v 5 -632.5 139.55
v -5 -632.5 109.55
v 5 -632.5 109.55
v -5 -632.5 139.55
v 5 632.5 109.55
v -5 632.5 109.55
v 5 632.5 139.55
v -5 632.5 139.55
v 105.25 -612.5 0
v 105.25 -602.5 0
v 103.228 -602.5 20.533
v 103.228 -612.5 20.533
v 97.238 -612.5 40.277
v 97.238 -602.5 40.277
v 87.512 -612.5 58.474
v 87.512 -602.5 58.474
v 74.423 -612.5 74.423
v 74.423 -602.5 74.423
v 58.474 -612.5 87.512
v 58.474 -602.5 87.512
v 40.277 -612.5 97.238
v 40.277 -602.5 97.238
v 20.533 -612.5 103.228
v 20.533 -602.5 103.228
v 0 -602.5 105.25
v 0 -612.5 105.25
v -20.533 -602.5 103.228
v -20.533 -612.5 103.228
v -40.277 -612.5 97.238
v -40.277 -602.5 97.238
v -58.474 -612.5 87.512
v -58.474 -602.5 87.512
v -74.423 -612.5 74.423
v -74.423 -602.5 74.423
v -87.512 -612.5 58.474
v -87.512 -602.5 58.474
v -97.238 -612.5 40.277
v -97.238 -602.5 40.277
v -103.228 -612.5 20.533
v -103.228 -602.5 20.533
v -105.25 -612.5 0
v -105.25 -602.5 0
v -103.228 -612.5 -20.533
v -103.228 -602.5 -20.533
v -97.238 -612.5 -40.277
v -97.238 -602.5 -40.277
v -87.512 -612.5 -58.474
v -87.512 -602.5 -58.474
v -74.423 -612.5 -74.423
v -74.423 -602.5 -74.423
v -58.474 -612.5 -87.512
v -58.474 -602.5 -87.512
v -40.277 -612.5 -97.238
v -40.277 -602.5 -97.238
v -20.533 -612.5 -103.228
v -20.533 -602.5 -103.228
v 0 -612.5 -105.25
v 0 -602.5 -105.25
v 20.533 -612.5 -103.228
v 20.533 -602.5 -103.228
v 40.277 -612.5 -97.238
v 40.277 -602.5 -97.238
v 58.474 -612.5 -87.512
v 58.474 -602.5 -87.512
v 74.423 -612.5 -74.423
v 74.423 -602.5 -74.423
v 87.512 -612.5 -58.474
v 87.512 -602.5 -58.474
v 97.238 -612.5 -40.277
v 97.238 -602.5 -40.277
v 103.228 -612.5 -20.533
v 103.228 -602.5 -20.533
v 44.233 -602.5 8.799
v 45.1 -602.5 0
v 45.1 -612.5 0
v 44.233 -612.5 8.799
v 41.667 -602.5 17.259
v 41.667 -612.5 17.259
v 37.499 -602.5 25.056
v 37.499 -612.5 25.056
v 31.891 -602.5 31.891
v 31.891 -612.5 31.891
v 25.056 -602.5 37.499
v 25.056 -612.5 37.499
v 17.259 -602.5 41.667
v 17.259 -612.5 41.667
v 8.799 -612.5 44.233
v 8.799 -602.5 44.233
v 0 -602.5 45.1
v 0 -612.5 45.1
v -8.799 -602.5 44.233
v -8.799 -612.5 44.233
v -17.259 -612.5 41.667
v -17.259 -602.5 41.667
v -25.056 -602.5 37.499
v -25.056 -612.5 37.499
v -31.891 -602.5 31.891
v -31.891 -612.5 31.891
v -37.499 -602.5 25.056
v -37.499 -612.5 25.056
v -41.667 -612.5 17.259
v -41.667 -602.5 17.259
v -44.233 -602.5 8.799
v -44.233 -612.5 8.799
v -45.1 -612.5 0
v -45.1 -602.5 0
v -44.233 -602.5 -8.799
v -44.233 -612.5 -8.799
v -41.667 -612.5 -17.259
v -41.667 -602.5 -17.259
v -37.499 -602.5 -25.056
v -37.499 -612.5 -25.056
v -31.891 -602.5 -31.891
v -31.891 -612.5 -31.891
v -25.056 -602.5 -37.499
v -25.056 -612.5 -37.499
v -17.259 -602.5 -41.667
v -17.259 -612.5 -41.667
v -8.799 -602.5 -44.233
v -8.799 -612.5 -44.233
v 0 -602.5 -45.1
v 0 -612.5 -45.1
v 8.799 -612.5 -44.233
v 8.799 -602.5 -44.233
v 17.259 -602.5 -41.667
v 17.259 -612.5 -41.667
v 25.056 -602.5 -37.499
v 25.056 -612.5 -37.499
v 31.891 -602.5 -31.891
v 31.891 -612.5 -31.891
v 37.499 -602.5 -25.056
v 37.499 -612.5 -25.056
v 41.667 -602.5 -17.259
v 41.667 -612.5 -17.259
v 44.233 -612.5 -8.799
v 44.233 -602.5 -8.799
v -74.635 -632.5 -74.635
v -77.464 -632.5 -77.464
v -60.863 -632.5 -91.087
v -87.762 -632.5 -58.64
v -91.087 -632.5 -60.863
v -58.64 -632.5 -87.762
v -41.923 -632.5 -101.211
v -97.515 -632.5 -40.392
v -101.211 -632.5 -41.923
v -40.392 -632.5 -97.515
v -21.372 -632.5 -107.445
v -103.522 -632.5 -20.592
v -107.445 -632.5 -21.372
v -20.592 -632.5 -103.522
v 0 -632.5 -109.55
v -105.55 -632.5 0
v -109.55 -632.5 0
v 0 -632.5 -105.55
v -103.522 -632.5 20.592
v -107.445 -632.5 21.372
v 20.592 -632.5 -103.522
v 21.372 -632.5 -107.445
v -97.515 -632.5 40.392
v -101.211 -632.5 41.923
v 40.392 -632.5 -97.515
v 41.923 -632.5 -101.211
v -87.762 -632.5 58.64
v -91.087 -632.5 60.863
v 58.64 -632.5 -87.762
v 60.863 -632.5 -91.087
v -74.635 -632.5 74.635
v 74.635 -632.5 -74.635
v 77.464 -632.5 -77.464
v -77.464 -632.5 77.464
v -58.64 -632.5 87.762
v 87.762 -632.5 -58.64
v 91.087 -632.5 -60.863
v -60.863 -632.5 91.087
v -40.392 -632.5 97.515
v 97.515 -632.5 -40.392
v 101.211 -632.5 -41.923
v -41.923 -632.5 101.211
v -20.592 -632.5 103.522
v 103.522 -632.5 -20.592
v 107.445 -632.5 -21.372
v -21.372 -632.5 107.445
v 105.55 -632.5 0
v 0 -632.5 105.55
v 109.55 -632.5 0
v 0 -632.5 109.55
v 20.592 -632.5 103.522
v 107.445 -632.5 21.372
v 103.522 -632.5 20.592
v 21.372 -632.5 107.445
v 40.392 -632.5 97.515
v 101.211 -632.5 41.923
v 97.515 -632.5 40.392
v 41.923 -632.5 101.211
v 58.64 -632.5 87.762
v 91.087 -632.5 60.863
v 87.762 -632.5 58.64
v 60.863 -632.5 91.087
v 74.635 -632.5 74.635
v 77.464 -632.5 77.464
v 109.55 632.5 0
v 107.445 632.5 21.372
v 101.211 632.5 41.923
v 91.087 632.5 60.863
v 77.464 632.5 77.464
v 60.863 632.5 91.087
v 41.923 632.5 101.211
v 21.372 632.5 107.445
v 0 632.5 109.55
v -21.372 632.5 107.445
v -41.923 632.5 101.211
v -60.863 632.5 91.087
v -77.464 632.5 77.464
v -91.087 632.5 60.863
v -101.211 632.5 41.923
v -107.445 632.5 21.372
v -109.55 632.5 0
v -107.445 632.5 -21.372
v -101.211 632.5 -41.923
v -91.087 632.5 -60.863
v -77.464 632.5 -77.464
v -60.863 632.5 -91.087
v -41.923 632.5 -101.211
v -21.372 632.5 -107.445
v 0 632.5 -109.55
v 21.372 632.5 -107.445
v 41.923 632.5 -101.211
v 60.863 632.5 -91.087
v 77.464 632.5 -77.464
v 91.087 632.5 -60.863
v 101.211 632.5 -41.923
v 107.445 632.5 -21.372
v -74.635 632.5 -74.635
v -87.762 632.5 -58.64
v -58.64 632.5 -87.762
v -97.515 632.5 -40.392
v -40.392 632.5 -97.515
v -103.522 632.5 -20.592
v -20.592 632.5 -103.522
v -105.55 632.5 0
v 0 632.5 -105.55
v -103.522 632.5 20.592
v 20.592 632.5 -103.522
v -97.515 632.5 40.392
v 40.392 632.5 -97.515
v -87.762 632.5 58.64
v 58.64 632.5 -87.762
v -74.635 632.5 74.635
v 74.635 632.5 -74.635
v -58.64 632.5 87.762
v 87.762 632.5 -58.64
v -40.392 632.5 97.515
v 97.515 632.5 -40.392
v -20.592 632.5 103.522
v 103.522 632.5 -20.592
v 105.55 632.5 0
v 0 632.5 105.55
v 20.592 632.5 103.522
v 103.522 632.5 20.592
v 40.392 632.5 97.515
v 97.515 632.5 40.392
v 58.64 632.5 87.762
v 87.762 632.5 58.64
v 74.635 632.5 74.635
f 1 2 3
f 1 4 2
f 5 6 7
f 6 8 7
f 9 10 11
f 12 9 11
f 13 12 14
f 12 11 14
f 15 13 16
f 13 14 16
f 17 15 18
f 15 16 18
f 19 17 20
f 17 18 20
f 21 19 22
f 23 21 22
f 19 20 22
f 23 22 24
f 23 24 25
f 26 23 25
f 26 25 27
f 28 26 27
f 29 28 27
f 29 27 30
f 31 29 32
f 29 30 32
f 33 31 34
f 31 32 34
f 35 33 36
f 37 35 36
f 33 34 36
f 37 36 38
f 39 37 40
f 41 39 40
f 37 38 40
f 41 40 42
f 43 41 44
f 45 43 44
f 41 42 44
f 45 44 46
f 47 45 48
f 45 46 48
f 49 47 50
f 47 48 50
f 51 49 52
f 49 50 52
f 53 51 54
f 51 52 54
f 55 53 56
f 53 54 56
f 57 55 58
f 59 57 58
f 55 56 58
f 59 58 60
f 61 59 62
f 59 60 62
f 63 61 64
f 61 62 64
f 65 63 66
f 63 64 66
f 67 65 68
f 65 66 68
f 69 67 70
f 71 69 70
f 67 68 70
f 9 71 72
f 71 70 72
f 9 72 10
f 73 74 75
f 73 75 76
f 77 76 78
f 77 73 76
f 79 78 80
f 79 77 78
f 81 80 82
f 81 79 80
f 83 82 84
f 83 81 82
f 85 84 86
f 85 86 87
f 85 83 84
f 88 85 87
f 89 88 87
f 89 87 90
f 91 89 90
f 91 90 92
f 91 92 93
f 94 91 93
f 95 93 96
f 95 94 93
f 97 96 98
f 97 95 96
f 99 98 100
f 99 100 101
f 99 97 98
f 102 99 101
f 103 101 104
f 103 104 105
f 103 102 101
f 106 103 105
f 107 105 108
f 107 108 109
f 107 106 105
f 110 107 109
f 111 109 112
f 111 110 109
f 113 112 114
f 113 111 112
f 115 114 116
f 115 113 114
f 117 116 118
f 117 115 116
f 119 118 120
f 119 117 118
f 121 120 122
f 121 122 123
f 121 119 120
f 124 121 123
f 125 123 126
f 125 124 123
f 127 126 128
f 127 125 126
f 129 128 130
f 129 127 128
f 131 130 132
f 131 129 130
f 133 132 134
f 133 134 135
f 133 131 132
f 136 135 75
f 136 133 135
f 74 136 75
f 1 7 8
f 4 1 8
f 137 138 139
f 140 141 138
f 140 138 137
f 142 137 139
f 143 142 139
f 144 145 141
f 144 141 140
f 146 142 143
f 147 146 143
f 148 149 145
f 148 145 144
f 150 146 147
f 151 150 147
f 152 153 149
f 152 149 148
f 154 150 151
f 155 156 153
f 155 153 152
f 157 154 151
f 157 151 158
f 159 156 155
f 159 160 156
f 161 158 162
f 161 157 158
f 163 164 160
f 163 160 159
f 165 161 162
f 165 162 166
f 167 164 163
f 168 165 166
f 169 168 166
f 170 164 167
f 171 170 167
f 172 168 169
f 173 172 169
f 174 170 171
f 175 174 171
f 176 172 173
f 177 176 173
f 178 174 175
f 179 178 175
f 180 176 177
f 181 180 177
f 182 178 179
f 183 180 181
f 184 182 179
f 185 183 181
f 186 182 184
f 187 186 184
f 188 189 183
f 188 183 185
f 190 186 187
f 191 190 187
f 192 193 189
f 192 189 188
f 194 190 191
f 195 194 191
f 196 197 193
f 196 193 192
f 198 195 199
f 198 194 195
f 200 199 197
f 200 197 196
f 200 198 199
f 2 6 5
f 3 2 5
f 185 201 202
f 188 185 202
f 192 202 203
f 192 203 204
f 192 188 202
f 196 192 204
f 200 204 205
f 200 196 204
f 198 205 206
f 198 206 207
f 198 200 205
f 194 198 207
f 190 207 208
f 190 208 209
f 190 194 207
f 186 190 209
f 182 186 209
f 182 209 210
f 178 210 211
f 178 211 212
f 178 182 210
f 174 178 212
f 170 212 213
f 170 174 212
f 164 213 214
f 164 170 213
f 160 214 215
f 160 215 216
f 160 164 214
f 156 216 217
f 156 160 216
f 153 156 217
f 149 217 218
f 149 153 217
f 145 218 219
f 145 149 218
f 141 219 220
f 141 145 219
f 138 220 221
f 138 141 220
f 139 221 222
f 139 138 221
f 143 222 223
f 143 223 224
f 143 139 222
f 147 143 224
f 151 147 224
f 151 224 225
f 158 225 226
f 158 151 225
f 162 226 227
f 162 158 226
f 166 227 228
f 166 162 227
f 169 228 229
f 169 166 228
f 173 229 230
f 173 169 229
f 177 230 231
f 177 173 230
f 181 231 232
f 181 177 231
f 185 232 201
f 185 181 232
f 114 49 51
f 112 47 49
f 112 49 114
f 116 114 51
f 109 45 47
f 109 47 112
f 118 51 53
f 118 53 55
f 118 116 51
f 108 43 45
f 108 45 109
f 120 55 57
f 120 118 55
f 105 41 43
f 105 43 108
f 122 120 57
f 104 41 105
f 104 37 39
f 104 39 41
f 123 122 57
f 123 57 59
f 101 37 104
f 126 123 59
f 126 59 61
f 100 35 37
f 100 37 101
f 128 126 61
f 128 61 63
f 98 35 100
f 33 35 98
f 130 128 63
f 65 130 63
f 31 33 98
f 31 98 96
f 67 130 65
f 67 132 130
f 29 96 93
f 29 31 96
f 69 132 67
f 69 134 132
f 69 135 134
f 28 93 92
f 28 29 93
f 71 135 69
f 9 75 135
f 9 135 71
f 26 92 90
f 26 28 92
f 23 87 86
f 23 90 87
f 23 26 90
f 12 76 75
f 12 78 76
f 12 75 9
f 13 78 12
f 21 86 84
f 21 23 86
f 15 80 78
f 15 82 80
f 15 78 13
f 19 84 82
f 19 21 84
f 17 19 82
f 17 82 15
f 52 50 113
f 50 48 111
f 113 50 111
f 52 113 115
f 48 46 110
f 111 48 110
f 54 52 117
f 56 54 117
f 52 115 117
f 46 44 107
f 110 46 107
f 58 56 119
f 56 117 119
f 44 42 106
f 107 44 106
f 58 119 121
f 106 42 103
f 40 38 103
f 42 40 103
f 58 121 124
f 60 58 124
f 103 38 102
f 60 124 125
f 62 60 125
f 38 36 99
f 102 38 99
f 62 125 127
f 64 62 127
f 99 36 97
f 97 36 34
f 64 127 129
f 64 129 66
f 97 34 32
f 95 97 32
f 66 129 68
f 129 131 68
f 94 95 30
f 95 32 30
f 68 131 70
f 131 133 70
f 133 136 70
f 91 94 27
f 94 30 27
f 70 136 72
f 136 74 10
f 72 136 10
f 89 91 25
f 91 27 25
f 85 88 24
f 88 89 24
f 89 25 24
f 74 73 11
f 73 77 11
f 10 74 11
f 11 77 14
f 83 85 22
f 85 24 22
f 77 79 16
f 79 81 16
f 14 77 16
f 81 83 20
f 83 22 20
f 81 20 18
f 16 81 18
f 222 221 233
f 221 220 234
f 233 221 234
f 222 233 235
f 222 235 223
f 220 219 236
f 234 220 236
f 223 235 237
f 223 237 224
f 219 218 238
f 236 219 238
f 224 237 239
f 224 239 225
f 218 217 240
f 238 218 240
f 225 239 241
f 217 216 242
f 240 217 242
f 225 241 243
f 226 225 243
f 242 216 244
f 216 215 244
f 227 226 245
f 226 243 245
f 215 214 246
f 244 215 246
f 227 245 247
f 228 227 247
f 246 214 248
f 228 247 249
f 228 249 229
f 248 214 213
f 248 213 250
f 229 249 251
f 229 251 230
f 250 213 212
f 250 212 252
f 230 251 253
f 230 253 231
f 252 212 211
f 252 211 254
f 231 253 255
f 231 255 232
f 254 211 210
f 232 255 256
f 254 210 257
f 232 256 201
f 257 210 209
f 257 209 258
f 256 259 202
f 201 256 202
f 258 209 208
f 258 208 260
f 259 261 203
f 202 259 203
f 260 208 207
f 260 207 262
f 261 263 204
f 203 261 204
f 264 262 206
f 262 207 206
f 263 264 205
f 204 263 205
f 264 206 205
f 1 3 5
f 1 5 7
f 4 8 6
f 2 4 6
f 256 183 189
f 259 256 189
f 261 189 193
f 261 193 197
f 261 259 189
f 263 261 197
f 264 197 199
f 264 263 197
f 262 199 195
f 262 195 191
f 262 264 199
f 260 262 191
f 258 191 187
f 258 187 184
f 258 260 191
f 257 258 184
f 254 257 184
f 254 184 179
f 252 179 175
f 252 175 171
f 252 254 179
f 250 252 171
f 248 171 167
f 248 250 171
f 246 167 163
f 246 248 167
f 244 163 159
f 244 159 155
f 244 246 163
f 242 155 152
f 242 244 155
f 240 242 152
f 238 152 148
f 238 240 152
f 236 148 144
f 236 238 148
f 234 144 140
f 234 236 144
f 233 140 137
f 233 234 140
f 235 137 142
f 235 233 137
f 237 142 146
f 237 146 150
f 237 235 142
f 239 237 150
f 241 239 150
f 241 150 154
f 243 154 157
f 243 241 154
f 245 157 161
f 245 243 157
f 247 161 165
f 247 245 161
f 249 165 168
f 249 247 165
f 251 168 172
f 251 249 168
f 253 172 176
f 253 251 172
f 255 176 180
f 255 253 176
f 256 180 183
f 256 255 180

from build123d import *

# Parameters (mm, degrees)
F1_R          = 105.55
F2_DEPTH      = 632.5
F3_START      = 602.5
F1_R_2        = 105.25
F1_R_3        = 45.1
F3_DEPTH      = 10
F4_DEPTH      = 632.5
F4_DEPTH_BACK = 632.5


with BuildPart() as f2:
    # F1 (on Front) → F2 (new body, symmetric)
    with BuildSketch(Plane.XZ):
        with BuildLine():
            ThreePointArc((0, 109.55), (-77.463547879, -77.463547879), (109.55, 0))
            ThreePointArc((109.55, 0), (77.463547879, 77.463547879), (0, 109.55))
        make_face()
        Circle(F1_R, mode=Mode.SUBTRACT)
    extrude(amount=F2_DEPTH, both=True)


with BuildPart() as f3:
    # F1 (on Front) → F3 (new body)
    with BuildSketch(Plane.XZ.offset(F3_START)):
        Circle(F1_R_2)
        Circle(F1_R_3, mode=Mode.SUBTRACT)
    extrude(amount=F3_DEPTH)


with BuildPart() as f4:
    # F1 (on Front) → F4 (new body, two sides)
    with BuildSketch(Plane.XZ) as f4_sk:
        Polygon((-5, 109.55), (0, 109.55), (5, 109.55), (5, 139.55), (-5, 139.55), align=None)
    extrude(amount=F4_DEPTH)
    extrude(f4_sk.sketch, amount=-F4_DEPTH_BACK)


solid = Compound([f2.part, f3.part, f4.part])
